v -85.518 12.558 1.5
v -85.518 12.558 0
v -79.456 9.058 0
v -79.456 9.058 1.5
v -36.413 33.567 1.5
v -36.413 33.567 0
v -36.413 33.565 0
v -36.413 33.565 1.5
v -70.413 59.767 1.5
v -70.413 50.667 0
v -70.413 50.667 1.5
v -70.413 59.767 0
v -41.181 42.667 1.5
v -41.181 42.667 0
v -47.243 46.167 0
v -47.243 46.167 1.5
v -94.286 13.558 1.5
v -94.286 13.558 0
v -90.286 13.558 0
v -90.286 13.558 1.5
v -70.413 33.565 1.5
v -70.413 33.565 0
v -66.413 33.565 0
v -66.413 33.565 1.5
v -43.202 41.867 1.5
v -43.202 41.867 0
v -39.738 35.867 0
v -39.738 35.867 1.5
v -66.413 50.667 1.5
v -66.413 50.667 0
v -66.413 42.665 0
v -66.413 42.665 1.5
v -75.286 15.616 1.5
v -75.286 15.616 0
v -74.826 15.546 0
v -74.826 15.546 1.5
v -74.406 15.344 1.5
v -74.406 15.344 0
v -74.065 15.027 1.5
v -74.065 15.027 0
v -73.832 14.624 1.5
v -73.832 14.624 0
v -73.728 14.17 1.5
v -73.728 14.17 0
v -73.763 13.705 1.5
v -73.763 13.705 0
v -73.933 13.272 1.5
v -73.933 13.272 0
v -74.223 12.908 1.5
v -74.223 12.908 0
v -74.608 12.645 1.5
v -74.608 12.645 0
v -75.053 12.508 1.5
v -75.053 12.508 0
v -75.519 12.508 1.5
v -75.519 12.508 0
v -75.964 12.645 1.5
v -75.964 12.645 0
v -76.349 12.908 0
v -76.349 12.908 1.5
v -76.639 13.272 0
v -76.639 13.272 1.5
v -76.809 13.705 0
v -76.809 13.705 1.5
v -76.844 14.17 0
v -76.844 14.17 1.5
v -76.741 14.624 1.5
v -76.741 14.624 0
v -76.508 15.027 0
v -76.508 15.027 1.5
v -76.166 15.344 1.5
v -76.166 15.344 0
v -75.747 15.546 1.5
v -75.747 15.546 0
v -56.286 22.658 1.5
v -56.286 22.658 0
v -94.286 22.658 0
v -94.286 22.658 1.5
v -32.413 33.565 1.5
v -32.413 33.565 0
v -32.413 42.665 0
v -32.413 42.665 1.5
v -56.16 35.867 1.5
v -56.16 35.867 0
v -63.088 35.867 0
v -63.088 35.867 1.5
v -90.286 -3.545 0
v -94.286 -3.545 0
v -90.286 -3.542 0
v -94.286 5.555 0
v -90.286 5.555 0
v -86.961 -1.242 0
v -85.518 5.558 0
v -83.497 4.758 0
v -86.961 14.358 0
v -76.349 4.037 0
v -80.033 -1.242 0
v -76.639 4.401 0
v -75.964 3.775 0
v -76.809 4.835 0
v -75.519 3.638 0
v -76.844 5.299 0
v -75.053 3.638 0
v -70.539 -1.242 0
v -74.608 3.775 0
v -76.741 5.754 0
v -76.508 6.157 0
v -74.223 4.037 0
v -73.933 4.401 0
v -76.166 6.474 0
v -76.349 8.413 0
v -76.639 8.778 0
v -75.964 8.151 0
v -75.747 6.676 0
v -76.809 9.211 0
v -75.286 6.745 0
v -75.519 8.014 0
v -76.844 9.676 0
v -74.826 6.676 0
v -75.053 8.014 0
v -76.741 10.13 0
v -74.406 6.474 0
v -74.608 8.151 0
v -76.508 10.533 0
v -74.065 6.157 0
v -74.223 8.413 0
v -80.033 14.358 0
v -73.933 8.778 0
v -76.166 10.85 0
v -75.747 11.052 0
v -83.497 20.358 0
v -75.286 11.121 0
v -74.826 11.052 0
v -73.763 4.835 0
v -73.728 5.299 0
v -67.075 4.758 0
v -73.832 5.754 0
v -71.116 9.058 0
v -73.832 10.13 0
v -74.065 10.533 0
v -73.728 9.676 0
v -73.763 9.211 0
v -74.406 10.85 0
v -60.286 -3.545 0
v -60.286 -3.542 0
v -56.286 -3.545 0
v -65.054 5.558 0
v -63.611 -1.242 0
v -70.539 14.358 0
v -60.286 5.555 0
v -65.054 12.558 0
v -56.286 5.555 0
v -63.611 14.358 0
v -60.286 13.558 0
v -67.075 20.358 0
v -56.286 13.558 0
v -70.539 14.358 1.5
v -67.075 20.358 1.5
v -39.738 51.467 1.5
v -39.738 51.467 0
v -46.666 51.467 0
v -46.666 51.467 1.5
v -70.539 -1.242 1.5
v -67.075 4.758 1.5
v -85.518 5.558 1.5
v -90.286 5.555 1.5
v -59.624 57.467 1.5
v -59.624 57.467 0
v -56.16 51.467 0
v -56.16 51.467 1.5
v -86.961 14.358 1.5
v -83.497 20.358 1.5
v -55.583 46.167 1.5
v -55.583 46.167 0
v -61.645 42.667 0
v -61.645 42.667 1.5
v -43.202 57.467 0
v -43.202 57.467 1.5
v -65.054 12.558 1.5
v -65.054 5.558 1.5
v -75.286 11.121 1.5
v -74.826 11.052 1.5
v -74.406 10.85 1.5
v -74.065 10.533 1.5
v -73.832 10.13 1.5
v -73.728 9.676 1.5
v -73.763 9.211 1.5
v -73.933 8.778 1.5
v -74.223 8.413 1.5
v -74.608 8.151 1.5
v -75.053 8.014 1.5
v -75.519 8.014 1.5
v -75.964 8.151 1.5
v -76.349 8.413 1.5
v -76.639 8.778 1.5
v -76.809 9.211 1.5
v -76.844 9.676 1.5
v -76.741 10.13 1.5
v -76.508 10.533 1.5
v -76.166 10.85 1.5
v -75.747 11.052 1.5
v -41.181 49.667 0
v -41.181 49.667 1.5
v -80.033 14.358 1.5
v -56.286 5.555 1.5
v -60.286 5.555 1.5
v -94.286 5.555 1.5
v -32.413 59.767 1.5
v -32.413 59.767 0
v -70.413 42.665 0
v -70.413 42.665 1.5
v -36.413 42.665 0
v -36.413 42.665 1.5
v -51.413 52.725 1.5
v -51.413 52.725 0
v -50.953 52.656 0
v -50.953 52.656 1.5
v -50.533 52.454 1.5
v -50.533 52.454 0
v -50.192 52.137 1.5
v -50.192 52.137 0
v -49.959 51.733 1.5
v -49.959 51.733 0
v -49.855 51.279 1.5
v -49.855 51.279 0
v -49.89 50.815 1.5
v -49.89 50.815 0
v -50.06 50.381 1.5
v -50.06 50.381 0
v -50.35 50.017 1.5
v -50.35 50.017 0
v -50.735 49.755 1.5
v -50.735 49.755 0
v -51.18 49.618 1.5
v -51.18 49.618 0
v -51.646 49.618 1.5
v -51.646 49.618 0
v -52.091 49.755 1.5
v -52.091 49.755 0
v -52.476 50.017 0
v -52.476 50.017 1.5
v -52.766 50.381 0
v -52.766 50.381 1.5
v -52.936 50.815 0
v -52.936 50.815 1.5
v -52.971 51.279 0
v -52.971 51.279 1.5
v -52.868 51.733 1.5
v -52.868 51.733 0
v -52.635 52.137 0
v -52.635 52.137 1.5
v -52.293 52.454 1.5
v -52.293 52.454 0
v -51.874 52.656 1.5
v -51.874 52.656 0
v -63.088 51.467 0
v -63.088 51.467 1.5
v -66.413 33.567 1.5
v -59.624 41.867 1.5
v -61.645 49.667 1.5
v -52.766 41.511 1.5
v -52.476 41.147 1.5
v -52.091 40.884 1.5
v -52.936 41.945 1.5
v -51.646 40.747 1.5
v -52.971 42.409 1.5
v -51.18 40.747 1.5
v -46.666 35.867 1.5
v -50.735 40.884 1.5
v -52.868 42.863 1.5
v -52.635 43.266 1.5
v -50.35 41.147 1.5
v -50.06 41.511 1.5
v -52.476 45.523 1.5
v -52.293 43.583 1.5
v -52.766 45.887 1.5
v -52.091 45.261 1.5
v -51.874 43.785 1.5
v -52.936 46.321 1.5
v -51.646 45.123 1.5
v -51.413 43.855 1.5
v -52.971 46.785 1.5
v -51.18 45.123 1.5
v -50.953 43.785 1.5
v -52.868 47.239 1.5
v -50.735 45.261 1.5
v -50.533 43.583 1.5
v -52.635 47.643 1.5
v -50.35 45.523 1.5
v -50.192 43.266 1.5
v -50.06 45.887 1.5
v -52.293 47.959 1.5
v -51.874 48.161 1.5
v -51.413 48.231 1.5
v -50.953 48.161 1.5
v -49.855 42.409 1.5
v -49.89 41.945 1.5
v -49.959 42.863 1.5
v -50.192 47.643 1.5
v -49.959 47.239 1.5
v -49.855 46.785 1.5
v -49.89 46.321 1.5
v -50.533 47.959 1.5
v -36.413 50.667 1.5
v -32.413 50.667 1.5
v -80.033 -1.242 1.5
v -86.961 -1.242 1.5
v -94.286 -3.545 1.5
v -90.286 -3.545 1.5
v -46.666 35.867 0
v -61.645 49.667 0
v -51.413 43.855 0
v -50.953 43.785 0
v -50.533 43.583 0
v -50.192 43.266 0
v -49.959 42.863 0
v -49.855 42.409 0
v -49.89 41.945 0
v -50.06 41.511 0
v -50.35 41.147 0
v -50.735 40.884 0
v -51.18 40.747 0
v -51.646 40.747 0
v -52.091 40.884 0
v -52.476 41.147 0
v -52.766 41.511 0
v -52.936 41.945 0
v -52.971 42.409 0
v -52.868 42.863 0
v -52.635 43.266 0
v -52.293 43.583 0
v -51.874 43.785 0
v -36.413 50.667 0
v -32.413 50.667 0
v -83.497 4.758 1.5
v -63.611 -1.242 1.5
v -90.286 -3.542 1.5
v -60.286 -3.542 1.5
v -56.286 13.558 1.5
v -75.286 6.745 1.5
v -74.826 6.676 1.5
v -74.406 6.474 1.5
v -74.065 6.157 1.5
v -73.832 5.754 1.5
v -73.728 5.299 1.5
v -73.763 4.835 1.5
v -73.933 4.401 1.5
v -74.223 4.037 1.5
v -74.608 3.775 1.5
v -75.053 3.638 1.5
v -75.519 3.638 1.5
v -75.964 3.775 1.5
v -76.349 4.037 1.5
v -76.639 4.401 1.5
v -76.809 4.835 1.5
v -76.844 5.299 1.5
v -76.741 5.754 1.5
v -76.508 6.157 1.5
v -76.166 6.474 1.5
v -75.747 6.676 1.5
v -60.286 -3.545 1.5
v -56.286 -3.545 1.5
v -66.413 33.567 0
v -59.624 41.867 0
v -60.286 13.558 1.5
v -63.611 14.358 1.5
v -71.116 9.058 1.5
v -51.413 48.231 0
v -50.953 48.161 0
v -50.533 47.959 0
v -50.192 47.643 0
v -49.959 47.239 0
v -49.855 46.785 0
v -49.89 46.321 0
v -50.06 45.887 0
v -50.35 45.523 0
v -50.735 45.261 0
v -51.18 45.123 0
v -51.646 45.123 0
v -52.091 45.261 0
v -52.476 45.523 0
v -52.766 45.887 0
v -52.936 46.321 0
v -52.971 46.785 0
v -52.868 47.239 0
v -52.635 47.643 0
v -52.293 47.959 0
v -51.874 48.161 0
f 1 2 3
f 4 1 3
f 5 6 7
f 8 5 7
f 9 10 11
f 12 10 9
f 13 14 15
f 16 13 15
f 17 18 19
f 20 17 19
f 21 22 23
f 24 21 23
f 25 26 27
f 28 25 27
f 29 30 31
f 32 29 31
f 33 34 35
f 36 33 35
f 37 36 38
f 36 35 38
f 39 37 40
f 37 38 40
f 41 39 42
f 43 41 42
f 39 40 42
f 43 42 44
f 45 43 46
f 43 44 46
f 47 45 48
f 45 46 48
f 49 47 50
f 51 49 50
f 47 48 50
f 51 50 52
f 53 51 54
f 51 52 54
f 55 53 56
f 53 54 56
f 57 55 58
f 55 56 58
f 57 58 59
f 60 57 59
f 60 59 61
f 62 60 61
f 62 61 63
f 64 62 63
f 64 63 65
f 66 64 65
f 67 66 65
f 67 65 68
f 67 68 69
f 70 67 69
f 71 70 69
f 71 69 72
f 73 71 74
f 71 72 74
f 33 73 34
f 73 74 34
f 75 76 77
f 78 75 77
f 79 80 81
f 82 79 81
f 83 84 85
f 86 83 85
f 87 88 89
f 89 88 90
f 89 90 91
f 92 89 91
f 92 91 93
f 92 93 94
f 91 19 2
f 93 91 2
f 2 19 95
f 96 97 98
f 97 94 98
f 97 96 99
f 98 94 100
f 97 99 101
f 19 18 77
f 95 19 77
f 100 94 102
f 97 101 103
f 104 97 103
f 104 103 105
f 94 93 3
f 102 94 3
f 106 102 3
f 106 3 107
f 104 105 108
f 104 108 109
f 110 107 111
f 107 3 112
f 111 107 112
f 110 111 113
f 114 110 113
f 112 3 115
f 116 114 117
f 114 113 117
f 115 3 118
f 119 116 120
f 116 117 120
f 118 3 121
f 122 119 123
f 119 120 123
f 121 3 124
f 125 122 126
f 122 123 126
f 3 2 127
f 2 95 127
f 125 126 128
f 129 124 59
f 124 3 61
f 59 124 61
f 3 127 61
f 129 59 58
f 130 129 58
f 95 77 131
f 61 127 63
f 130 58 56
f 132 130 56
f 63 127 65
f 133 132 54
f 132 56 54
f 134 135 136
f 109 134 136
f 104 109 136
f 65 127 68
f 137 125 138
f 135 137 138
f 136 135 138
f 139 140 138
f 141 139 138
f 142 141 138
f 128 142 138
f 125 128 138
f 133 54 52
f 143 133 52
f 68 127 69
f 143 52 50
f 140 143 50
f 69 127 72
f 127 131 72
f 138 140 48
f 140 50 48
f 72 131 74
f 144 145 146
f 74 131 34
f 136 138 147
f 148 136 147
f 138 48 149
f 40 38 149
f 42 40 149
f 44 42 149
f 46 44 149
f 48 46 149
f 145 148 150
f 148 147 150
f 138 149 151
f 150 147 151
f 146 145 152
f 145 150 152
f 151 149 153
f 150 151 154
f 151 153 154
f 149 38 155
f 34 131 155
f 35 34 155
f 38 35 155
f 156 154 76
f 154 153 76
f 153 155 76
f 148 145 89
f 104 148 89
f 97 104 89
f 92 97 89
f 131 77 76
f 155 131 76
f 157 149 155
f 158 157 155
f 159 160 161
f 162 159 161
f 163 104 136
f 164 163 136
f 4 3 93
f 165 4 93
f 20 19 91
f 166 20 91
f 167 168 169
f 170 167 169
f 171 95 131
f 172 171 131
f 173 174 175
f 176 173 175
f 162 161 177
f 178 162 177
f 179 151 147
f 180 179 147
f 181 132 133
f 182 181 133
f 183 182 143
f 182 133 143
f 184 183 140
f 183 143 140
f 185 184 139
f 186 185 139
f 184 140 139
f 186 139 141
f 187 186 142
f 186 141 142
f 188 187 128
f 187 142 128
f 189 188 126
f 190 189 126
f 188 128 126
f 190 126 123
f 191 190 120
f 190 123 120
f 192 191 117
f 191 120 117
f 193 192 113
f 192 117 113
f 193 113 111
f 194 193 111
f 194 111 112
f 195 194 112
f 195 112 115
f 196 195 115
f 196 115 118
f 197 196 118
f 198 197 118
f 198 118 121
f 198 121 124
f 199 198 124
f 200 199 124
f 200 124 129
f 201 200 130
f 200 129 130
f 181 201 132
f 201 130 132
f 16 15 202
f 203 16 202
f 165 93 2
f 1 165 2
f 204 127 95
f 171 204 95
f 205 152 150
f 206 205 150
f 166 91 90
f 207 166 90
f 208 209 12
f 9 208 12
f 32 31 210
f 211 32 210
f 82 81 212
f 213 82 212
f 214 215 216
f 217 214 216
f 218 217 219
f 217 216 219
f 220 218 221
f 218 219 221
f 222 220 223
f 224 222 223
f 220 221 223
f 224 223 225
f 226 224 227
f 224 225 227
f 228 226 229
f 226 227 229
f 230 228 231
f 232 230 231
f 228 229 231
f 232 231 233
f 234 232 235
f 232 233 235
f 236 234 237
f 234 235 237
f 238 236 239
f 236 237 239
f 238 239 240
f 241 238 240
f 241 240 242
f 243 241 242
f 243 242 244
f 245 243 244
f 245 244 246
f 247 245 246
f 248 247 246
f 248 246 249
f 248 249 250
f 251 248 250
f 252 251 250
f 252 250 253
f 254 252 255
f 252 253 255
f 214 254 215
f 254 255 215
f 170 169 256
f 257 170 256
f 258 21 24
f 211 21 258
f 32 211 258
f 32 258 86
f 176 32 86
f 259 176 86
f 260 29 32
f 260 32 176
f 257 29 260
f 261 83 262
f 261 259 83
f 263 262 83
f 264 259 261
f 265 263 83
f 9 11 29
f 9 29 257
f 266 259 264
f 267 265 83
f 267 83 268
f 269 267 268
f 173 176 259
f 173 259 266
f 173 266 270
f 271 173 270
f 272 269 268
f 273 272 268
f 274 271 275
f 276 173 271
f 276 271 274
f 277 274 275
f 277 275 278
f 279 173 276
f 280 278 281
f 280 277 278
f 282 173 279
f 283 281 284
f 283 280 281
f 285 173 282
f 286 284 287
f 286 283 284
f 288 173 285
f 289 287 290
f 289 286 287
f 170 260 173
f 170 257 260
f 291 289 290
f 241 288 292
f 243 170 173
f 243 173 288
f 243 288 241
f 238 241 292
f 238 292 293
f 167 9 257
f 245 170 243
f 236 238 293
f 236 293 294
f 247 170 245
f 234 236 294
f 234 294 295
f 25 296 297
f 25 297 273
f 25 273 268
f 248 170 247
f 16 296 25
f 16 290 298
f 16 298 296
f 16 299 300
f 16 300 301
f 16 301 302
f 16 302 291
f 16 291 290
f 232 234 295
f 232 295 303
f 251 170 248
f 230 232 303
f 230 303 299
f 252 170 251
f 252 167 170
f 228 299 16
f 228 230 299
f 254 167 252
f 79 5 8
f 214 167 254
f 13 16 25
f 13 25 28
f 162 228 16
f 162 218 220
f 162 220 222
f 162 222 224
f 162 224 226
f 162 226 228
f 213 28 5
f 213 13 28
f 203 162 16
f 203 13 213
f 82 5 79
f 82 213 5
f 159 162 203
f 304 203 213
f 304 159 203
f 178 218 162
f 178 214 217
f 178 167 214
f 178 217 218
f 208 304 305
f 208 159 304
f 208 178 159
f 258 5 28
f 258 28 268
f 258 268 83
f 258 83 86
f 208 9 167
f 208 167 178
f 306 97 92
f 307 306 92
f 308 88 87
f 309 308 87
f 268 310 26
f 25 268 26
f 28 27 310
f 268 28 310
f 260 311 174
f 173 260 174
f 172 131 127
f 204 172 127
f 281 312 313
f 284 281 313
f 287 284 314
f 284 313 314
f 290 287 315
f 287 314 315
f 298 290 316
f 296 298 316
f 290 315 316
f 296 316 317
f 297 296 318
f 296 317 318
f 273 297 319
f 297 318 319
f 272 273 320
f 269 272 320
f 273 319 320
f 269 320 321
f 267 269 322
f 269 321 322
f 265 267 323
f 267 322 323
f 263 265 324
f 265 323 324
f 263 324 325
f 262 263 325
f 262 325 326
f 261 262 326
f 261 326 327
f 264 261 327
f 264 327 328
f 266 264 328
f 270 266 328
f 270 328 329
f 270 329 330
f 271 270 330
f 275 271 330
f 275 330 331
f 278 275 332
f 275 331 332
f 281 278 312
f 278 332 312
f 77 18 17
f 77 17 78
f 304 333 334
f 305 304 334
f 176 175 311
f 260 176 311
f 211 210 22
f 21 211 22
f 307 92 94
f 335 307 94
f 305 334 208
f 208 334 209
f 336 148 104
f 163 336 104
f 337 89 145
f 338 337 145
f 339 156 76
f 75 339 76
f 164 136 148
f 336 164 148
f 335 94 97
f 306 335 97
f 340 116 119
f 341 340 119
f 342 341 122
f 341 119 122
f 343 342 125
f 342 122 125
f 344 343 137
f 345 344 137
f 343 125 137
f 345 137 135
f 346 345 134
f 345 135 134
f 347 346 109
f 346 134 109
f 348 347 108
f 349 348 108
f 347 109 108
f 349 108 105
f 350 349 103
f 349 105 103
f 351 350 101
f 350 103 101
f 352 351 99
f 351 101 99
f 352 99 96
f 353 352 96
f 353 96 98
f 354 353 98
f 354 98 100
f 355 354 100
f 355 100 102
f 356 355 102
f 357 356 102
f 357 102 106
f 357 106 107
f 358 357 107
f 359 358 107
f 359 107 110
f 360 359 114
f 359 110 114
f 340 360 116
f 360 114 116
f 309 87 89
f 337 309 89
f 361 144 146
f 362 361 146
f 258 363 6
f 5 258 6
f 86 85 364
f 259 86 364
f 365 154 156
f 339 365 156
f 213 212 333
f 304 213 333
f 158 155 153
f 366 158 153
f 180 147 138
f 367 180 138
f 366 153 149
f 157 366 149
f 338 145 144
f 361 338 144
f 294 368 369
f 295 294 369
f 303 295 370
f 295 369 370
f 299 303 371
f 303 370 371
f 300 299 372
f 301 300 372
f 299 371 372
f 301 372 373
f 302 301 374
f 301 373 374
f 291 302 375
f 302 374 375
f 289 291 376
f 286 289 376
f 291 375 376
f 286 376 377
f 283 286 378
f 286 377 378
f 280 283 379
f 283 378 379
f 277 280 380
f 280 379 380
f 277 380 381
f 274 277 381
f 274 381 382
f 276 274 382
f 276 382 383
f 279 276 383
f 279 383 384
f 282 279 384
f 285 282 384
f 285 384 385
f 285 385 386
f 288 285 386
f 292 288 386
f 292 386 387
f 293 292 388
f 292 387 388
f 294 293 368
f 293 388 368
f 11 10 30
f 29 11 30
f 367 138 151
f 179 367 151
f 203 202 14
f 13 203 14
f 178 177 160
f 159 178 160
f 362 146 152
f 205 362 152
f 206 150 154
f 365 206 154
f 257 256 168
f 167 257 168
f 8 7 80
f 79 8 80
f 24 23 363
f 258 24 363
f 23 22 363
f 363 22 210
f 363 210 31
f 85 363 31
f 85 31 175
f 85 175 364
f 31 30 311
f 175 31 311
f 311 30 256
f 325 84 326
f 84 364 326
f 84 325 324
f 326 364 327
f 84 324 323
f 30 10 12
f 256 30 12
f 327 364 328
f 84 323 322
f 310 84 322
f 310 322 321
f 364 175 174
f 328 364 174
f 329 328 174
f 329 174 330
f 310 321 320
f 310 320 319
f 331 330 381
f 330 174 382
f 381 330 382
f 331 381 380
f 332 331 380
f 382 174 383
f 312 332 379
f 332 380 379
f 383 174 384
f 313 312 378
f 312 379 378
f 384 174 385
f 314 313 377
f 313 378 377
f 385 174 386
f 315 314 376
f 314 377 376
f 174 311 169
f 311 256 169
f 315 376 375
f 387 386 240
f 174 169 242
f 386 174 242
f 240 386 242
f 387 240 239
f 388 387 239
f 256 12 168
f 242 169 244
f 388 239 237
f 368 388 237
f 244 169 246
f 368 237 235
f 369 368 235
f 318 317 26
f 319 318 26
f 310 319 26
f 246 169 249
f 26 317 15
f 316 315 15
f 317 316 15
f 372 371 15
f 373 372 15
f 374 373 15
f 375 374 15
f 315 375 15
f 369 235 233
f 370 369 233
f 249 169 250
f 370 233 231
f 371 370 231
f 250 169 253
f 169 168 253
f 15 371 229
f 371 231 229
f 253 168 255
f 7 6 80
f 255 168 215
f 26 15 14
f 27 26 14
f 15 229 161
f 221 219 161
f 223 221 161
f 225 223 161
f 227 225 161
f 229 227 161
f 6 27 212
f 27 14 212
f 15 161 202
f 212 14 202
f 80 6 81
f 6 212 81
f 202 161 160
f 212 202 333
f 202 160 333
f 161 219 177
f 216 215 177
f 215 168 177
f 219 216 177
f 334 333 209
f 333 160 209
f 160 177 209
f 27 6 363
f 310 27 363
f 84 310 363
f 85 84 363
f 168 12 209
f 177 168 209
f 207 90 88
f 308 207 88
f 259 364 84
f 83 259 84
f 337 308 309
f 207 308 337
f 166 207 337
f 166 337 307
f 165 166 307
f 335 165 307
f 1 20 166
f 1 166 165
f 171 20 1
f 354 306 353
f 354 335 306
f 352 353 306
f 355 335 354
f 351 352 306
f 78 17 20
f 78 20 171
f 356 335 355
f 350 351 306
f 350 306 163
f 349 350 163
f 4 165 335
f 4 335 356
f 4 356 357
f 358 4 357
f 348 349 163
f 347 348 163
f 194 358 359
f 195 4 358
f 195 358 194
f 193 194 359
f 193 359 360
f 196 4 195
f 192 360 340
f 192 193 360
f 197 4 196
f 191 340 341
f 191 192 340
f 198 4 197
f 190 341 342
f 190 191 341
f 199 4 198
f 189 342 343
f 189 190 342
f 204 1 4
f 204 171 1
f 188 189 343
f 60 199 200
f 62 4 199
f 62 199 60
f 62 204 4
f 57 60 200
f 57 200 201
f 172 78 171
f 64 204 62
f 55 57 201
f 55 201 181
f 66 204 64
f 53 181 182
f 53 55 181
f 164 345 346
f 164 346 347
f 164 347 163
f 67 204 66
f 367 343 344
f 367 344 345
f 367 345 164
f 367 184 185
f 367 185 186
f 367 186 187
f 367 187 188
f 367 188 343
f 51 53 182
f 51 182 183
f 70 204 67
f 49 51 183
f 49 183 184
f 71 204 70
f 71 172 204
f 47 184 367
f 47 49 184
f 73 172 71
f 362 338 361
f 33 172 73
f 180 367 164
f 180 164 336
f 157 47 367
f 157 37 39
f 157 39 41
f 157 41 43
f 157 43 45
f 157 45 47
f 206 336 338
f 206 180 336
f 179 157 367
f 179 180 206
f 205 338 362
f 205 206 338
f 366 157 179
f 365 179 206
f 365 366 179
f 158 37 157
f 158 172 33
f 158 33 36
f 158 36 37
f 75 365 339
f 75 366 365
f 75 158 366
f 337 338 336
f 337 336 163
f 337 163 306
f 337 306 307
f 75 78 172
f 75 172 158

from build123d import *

# Parameters (mm, degrees)
F0_W     = 4
F0_H     = 9.1
F1_DEPTH = 1.5
F2_DEPTH = 1.5


with BuildPart() as f1:
    # F0 (on Top) → F1 (new body)
    with BuildSketch(Plane.XY):
        with Locations((-68.413132, 55.217268)):
            Rectangle(F0_W, F0_H)
        Polygon((-66.413132, 33.567268), (-66.413132, 42.665003), (-70.413132, 42.665003), (-70.413132, 33.565003), (-66.413132, 33.565003), align=None)
        with BuildLine():
            Line((-51.413132, 59.767268), (-66.413132, 59.767268))
            Line((-66.413132, 59.767268), (-66.413132, 50.667268))
            Line((-66.413132, 50.667268), (-66.413132, 42.665003))
            Line((-66.413132, 42.665003), (-66.413132, 33.567268))
            Line((-66.413132, 33.567268), (-51.413132, 33.567268))
            Line((-51.413132, 33.567268), (-51.413132, 40.729722))
            ThreePointArc((-51.413132, 40.729722), (-52.975632, 42.292222), (-51.413132, 43.854722))
            Line((-51.413132, 43.854722), (-51.413132, 45.105903))
            ThreePointArc((-51.413132, 45.105903), (-52.975632, 46.668403), (-51.413132, 48.230903))
            Line((-51.413132, 48.230903), (-51.413132, 49.600074))
            ThreePointArc((-51.413132, 49.600074), (-52.975632, 51.162574), (-51.413132, 52.725074))
            Line((-51.413132, 52.725074), (-51.413132, 59.767268))
        make_face()
        Polygon((-59.624343, 41.867268), (-56.160241, 35.867268), (-63.088444, 35.867268), align=None, mode=Mode.SUBTRACT)
        Polygon((-61.645069, 49.667268), (-55.582891, 46.167268), (-61.645069, 42.667268), align=None, mode=Mode.SUBTRACT)
        Polygon((-59.624343, 57.467268), (-56.160241, 51.467268), (-63.088444, 51.467268), align=None, mode=Mode.SUBTRACT)
        with BuildLine():
            Line((-36.413132, 59.767268), (-51.413132, 59.767268))
            Line((-51.413132, 59.767268), (-51.413132, 52.725074))
            ThreePointArc((-51.413132, 52.725074), (-49.850632, 51.162574), (-51.413132, 49.600074))
            Line((-51.413132, 49.600074), (-51.413132, 48.230903))
            ThreePointArc((-51.413132, 48.230903), (-49.850632, 46.668403), (-51.413132, 45.105903))
            Line((-51.413132, 45.105903), (-51.413132, 43.854722))
            ThreePointArc((-51.413132, 43.854722), (-49.850632, 42.292222), (-51.413132, 40.729722))
            Line((-51.413132, 40.729722), (-51.413132, 33.567268))
            Line((-51.413132, 33.567268), (-36.413132, 33.567268))
            Line((-36.413132, 33.567268), (-36.413132, 42.665003))
            Line((-36.413132, 42.665003), (-36.413132, 50.667268))
            Line((-36.413132, 50.667268), (-36.413132, 59.767268))
        make_face()
        Polygon((-43.20192, 41.867268), (-39.737819, 35.867268), (-46.666022, 35.867268), align=None, mode=Mode.SUBTRACT)
        Polygon((-41.181194, 49.667268), (-41.181194, 42.667268), (-47.243372, 46.167268), align=None, mode=Mode.SUBTRACT)
        Polygon((-43.20192, 57.467268), (-39.737819, 51.467268), (-46.666022, 51.467268), align=None, mode=Mode.SUBTRACT)
        Polygon((-32.413132, 42.665003), (-36.413132, 42.665003), (-36.413132, 33.567268), (-36.413132, 33.565003), (-32.413132, 33.565003), align=None)
        with Locations((-34.413132, 55.217268)):
            Rectangle(F0_W, F0_H)
    extrude(amount=F1_DEPTH)


with BuildPart() as f2:
    # F0 (on Top) → F2 (new body)
    with BuildSketch(Plane.XY):
        with Locations((-92.286137, 18.107755)):
            Rectangle(F0_W, F0_H)
        with BuildLine():
            Line((-75.286137, 22.657755), (-90.286137, 22.657755))
            Line((-90.286137, 22.657755), (-90.286137, 13.557755))
            Line((-90.286137, 13.557755), (-90.286137, 5.55549))
            Line((-90.286137, 5.55549), (-90.286137, -3.542245))
            Line((-90.286137, -3.542245), (-75.286137, -3.542245))
            Line((-75.286137, -3.542245), (-75.286137, 3.620208))
            ThreePointArc((-75.286137, 3.620208), (-76.848637, 5.182708), (-75.286137, 6.745208))
            Line((-75.286137, 6.745208), (-75.286137, 7.99639))
            ThreePointArc((-75.286137, 7.99639), (-76.848637, 9.55889), (-75.286137, 11.12139))
            Line((-75.286137, 11.12139), (-75.286137, 12.490561))
            ThreePointArc((-75.286137, 12.490561), (-76.848637, 14.053061), (-75.286137, 15.615561))
            Line((-75.286137, 15.615561), (-75.286137, 22.657755))
        make_face()
        Polygon((-83.497348, 4.757755), (-80.033246, -1.242245), (-86.961449, -1.242245), align=None, mode=Mode.SUBTRACT)
        Polygon((-85.518074, 12.557755), (-79.455896, 9.057755), (-85.518074, 5.557755), align=None, mode=Mode.SUBTRACT)
        Polygon((-83.497348, 20.357755), (-80.033246, 14.357755), (-86.961449, 14.357755), align=None, mode=Mode.SUBTRACT)
        Polygon((-90.286137, -3.542245), (-90.286137, 5.55549), (-94.286137, 5.55549), (-94.286137, -3.54451), (-90.286137, -3.54451), align=None)
        with BuildLine():
            Line((-60.286137, 22.657755), (-75.286137, 22.657755))
            Line((-75.286137, 22.657755), (-75.286137, 15.615561))
            ThreePointArc((-75.286137, 15.615561), (-73.723637, 14.053061), (-75.286137, 12.490561))
            Line((-75.286137, 12.490561), (-75.286137, 11.12139))
            ThreePointArc((-75.286137, 11.12139), (-73.723637, 9.55889), (-75.286137, 7.99639))
            Line((-75.286137, 7.99639), (-75.286137, 6.745208))
            ThreePointArc((-75.286137, 6.745208), (-73.723637, 5.182708), (-75.286137, 3.620208))
            Line((-75.286137, 3.620208), (-75.286137, -3.542245))
            Line((-75.286137, -3.542245), (-60.286137, -3.542245))
            Line((-60.286137, -3.542245), (-60.286137, 5.55549))
            Line((-60.286137, 5.55549), (-60.286137, 13.557755))
            Line((-60.286137, 13.557755), (-60.286137, 22.657755))
        make_face()
        Polygon((-67.074925, 4.757755), (-63.610824, -1.242245), (-70.539027, -1.242245), align=None, mode=Mode.SUBTRACT)
        Polygon((-65.054199, 12.557755), (-65.054199, 5.557755), (-71.116377, 9.057755), align=None, mode=Mode.SUBTRACT)
        Polygon((-67.074925, 20.357755), (-63.610824, 14.357755), (-70.539027, 14.357755), align=None, mode=Mode.SUBTRACT)
        Polygon((-56.286137, 5.55549), (-60.286137, 5.55549), (-60.286137, -3.542245), (-60.286137, -3.54451), (-56.286137, -3.54451), align=None)
        with Locations((-58.286137, 18.107755)):
            Rectangle(F0_W, F0_H)
    extrude(amount=F2_DEPTH)


solid = Compound([f1.part, f2.part])
